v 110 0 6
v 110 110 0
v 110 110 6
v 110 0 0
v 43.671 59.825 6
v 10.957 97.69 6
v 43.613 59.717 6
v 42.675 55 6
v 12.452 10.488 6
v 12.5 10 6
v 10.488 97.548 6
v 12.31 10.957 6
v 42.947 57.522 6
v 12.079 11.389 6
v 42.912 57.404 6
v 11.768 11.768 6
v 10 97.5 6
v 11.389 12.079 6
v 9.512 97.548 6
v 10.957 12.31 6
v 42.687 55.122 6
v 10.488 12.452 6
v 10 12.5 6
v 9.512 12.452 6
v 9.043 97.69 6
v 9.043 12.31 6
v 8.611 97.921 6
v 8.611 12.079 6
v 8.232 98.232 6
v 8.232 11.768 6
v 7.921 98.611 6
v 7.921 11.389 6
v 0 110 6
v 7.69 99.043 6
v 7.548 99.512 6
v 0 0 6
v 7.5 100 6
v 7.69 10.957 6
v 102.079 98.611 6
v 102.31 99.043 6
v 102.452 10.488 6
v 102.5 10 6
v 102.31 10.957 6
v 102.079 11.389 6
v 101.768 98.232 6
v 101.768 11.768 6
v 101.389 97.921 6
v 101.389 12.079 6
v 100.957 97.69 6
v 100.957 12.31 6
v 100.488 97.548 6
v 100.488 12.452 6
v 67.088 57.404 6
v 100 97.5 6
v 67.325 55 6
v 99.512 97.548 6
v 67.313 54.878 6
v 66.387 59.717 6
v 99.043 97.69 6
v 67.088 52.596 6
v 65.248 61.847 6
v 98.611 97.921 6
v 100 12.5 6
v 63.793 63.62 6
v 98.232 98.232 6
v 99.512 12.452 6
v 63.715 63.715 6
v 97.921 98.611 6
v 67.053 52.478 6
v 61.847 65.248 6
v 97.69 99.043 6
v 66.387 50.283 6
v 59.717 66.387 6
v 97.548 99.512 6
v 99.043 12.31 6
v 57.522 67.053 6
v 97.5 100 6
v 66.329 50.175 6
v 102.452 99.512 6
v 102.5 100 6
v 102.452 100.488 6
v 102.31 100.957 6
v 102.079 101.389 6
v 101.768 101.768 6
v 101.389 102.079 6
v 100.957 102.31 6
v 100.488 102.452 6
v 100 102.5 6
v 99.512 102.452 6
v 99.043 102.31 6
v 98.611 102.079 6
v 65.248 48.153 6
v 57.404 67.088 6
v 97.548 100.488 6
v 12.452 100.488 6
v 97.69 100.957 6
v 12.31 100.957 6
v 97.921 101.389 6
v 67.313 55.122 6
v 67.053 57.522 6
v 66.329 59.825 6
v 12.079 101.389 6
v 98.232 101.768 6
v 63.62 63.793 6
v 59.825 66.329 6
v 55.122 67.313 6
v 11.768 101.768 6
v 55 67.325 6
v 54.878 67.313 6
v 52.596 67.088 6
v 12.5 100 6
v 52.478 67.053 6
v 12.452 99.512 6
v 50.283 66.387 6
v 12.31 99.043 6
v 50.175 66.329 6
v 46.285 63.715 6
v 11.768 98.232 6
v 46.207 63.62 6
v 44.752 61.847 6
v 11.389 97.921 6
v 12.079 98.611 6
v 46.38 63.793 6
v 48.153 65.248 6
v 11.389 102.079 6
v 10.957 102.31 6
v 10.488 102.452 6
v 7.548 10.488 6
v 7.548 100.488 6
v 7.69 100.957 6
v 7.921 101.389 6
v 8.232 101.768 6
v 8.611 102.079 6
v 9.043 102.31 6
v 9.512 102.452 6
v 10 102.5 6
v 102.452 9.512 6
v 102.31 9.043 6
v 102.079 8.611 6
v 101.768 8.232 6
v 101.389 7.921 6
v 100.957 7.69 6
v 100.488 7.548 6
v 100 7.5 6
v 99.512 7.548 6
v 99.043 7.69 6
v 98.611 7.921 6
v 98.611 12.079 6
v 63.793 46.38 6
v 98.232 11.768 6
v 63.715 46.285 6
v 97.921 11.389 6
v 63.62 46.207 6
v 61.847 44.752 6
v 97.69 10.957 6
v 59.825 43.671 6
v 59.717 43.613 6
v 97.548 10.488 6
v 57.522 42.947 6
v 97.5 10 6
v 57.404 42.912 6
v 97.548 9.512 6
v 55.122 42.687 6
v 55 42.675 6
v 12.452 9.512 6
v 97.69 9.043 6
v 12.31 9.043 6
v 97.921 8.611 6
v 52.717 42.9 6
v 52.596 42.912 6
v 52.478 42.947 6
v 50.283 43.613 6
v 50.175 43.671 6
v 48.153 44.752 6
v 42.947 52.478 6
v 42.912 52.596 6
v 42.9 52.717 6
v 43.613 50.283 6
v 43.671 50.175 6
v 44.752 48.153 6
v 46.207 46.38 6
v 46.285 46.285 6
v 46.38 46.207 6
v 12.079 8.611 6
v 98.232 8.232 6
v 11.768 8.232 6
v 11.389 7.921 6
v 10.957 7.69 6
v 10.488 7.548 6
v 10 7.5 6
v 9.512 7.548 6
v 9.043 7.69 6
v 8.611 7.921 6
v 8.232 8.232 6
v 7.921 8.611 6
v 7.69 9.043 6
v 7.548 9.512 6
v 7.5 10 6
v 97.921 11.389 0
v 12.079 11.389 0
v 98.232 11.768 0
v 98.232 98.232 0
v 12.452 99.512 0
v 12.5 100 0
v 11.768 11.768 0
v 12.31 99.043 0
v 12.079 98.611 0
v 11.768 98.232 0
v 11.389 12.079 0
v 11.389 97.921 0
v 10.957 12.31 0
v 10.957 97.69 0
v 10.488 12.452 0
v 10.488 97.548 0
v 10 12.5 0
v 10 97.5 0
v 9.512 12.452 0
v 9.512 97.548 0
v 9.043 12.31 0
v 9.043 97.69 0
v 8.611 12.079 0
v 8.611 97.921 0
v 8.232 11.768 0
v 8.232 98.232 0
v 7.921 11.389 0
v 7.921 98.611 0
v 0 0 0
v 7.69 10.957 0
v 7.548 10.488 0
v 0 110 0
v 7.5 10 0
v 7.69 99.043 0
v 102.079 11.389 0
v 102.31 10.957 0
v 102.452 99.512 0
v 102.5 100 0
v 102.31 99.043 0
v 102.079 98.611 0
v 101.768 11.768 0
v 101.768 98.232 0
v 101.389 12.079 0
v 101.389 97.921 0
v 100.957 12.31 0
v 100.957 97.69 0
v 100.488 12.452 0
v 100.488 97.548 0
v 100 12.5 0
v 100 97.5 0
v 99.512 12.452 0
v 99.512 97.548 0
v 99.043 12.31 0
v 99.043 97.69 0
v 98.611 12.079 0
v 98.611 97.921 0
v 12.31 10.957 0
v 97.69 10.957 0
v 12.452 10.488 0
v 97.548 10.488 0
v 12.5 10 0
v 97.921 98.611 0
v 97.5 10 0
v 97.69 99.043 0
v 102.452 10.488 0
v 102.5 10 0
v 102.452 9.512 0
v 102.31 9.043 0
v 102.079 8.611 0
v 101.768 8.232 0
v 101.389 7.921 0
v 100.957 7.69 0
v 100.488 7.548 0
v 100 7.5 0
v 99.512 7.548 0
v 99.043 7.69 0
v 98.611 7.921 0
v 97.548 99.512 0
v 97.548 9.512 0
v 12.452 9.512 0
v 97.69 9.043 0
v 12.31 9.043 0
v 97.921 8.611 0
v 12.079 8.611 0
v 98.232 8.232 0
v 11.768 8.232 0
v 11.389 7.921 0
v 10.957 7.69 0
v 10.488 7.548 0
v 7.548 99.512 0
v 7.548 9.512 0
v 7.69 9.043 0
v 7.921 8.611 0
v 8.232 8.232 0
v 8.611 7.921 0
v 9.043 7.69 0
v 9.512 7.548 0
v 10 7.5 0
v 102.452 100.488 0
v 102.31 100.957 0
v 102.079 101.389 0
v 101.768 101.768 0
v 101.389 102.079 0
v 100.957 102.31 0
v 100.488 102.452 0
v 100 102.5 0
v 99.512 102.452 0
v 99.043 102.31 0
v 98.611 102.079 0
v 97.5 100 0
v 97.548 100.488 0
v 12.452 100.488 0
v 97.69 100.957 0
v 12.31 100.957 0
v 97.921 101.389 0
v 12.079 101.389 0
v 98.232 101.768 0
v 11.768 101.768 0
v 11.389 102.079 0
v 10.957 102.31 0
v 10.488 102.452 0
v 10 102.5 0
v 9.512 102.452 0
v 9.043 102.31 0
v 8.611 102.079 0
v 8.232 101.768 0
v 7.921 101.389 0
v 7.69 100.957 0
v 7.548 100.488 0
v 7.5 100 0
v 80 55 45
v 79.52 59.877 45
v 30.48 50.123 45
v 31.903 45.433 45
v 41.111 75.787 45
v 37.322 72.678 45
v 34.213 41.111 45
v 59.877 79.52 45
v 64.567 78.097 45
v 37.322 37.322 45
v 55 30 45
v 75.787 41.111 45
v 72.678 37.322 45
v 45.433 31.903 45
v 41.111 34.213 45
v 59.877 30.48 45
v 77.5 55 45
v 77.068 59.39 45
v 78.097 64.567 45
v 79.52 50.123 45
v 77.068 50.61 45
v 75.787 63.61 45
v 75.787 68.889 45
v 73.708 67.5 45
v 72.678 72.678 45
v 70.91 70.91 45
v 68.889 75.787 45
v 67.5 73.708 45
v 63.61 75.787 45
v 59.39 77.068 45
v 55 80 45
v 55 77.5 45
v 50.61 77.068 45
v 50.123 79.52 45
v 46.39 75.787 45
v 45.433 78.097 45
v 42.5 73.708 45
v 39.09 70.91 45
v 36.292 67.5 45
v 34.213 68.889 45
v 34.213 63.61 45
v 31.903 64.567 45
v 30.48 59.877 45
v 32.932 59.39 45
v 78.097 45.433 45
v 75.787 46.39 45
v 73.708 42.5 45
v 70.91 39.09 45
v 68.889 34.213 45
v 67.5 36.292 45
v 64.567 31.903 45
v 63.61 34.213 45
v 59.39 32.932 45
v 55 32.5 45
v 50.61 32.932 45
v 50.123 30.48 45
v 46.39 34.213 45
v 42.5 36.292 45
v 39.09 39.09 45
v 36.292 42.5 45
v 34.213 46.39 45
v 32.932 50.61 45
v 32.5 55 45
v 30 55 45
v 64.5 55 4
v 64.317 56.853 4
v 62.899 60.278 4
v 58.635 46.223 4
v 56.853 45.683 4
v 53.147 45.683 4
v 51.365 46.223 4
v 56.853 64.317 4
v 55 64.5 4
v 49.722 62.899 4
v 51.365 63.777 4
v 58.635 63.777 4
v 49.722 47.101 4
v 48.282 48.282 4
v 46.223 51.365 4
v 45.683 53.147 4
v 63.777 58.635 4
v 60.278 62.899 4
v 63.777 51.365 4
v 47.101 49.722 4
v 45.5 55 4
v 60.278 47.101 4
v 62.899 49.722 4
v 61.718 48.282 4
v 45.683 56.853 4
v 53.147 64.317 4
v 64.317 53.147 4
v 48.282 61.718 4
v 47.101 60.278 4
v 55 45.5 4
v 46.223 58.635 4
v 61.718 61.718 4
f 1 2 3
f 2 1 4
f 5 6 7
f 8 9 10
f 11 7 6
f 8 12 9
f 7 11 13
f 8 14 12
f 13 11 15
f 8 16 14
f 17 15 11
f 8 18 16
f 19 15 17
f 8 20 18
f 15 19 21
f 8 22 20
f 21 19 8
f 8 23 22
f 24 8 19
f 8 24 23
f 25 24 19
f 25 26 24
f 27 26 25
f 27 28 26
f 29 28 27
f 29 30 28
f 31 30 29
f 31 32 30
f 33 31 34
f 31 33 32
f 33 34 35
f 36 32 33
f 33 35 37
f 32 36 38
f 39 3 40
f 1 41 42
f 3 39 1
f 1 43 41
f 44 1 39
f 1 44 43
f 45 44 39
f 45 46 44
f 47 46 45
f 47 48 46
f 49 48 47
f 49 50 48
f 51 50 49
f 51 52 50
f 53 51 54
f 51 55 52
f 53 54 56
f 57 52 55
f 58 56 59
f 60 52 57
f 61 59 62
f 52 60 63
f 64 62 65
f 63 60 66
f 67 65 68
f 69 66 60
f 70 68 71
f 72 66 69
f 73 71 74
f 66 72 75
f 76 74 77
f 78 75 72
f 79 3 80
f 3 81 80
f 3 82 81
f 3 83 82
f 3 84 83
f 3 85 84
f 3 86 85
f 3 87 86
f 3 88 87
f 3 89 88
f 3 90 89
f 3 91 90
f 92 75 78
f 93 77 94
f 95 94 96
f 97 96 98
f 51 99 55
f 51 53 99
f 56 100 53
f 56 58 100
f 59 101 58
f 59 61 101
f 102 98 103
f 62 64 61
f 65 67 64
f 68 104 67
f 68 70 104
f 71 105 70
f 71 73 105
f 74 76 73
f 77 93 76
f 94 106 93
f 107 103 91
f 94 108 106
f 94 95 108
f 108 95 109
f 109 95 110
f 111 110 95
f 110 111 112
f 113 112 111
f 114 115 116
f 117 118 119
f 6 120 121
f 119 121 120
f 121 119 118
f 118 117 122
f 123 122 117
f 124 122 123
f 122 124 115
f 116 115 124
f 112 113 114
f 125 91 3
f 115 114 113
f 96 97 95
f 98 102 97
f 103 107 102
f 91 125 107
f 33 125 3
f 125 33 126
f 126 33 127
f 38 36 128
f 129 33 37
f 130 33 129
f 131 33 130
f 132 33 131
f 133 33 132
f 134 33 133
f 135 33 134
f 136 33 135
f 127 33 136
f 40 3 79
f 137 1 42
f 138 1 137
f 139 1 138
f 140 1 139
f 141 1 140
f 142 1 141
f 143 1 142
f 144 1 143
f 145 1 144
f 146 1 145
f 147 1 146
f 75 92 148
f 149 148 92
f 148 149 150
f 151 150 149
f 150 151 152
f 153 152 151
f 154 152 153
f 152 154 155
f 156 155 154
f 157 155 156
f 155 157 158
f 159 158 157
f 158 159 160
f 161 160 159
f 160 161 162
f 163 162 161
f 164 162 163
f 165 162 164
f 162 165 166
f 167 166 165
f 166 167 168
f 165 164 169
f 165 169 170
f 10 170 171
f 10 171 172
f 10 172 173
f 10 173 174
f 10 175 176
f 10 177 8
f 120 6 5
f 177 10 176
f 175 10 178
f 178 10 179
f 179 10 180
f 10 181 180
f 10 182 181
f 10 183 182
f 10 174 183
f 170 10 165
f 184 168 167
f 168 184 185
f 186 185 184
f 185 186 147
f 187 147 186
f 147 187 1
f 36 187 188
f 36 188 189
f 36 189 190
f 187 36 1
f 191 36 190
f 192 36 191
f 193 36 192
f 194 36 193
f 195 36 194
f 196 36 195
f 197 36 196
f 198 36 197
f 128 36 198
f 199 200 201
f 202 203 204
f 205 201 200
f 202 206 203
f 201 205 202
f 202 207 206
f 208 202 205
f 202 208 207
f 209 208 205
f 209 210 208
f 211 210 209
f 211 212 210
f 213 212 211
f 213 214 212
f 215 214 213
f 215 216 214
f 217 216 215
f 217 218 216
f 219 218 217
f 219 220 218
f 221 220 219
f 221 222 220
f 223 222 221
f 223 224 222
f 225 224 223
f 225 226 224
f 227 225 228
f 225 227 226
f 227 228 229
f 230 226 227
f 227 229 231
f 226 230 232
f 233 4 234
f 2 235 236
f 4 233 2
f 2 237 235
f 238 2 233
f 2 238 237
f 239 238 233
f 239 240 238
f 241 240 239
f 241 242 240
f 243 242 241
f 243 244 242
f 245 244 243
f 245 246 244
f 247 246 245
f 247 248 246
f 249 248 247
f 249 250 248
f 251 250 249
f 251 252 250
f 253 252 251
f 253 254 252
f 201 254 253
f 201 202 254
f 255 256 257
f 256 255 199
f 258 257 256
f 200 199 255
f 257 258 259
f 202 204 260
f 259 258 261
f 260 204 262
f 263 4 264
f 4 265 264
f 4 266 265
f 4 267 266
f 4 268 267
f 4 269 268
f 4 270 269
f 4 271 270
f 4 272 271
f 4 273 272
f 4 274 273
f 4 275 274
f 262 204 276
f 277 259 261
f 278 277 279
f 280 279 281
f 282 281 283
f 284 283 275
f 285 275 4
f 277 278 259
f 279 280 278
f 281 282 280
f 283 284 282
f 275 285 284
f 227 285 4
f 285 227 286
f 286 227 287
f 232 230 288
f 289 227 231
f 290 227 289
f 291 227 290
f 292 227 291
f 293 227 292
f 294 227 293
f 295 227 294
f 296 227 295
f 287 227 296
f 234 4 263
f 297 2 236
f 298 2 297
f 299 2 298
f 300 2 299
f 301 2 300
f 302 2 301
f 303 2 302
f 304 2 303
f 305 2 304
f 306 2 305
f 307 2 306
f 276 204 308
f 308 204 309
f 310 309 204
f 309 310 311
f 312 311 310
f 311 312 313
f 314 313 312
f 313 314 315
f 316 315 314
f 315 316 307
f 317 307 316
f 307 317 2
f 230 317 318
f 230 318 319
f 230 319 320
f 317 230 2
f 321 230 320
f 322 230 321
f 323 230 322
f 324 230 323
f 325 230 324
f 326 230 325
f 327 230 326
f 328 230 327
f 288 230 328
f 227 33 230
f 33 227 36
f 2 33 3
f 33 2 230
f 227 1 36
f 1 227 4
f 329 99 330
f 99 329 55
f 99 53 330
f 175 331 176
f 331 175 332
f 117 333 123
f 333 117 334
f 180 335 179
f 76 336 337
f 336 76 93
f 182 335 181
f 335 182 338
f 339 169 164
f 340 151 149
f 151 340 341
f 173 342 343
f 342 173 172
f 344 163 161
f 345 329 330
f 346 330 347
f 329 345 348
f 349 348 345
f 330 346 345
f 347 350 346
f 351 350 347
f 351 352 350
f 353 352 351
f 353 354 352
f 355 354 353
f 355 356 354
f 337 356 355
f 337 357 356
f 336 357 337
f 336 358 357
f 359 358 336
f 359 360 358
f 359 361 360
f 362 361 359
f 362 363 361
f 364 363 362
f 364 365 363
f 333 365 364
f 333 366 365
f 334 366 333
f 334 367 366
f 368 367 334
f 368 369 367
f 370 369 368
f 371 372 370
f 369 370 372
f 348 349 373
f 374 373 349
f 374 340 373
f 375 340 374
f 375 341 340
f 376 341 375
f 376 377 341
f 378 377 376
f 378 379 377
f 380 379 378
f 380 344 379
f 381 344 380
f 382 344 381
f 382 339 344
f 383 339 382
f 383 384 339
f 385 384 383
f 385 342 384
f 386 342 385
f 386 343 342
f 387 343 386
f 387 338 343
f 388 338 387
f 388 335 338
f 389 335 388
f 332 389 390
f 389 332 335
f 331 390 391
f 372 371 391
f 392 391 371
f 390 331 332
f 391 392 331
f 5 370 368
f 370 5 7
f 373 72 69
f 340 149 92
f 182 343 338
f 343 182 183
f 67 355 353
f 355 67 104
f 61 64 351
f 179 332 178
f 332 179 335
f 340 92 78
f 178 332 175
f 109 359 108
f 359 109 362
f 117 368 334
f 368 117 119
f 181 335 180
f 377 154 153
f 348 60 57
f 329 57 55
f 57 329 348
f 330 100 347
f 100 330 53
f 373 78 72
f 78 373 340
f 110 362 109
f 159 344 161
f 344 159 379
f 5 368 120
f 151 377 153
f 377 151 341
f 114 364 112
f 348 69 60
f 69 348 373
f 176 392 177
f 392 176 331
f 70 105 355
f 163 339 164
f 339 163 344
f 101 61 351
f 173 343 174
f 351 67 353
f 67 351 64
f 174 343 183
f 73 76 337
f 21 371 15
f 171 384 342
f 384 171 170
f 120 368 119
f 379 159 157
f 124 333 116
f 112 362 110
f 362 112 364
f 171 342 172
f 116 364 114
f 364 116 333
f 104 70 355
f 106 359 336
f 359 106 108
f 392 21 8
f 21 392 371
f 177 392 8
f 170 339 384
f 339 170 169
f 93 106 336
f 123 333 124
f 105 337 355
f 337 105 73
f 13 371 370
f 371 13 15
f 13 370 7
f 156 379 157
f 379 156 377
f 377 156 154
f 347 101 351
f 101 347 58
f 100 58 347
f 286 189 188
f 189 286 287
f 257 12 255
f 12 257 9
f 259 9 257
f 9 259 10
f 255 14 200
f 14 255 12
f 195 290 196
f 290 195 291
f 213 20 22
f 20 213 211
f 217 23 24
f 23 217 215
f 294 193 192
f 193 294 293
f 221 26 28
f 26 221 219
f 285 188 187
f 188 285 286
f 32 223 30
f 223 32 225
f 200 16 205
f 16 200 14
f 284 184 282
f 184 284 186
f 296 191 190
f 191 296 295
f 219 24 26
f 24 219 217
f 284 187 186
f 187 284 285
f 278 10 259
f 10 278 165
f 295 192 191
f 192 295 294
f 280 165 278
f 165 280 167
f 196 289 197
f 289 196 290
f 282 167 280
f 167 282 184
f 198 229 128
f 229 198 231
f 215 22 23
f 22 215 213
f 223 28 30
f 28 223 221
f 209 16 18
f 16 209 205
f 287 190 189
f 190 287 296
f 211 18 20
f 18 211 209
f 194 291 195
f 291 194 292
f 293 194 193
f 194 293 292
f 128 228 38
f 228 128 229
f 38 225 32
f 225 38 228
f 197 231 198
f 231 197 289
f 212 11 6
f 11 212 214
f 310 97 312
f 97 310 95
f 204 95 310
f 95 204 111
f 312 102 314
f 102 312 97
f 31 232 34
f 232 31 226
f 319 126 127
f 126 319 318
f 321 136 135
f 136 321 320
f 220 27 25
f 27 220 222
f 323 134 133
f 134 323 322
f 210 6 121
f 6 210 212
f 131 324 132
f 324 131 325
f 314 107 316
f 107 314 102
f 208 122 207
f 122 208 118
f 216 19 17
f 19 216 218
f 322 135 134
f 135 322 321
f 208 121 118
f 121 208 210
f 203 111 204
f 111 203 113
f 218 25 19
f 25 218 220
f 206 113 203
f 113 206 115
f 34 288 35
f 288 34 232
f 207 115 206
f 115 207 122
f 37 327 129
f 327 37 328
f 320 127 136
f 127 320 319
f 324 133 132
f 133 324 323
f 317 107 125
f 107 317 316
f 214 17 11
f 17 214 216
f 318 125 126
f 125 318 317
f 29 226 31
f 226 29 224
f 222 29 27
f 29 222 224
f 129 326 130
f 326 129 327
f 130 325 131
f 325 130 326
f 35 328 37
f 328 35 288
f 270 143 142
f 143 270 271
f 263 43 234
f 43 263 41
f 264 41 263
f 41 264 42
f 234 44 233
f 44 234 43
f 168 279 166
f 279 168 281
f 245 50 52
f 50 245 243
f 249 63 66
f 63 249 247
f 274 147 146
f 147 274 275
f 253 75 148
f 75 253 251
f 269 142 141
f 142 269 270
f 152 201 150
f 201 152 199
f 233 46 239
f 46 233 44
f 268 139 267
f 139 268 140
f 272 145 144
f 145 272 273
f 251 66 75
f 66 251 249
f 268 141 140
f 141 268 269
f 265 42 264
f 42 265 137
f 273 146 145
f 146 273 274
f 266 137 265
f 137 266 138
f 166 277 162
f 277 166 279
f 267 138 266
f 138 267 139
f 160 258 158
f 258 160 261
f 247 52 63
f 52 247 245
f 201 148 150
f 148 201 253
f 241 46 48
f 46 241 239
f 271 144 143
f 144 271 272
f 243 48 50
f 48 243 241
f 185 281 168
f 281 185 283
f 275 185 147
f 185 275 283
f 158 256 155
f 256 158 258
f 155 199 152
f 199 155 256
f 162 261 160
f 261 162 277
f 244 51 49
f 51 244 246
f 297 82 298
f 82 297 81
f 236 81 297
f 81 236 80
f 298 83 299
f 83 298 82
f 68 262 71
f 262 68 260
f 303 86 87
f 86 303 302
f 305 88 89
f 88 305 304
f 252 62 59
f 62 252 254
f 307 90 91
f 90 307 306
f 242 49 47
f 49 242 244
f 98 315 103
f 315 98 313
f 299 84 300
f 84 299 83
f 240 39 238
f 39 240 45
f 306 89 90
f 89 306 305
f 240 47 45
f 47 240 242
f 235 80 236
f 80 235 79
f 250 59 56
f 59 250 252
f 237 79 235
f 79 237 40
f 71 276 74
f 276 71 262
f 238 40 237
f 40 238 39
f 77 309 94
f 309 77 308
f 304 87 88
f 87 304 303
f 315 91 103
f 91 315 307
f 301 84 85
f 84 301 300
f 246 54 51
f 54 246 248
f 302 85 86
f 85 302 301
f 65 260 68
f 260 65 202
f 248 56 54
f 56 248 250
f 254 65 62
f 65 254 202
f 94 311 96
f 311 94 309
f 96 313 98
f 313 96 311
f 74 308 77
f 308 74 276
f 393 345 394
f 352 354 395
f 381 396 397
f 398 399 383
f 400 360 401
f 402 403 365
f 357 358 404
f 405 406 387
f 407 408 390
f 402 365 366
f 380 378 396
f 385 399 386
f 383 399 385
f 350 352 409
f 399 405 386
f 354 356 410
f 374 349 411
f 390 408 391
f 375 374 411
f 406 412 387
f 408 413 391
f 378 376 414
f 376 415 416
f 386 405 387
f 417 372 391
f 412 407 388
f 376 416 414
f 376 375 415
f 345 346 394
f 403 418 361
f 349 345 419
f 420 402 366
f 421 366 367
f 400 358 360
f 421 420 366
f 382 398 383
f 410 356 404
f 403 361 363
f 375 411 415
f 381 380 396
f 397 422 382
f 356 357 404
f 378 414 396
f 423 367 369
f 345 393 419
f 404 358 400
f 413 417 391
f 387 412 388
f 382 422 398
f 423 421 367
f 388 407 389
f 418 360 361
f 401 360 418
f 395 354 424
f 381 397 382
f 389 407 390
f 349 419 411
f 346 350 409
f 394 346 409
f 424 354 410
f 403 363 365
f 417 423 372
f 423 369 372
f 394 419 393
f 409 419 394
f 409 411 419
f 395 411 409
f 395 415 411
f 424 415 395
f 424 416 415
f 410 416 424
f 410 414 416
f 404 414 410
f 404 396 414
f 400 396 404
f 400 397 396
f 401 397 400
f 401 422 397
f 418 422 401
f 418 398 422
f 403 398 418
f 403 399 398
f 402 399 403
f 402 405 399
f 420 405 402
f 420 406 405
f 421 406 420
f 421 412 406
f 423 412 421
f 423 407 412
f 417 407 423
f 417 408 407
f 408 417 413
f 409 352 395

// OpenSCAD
$fn = 32;

// ----------------------------------------------------------------------
// Hopper: flanged with square flange
// ----------------------------------------------------------------------

// --- parameters (mm) ---
fl = 110;                 // flange side, X and Y
fl_t = 6;                 // flange thickness
cone_h = 40;              // cone height above the flange
top_d = 50;               // cone mouth diameter
bot_d = 24;               // cone spout diameter
wall = 2.5;               // cone wall thickness
hole_r = 2.5;             // flange hole radius
hole_in = 10;             // hole inset from the corners

bore_d = bot_d - 2 * wall;  // spout bore diameter
total_h = fl_t + cone_h - 1;  // overall height

difference() {
  union() {
    cube([fl, fl, fl_t]);
    translate([fl / 2, fl / 2, fl_t - 1])
      cylinder(h = cone_h, d1 = bot_d, d2 = top_d);
  }
  translate([fl / 2, fl / 2, fl_t - 2])
    cylinder(h = cone_h + 1, d1 = bore_d, d2 = top_d - 2 * wall);
  for (sx = [0, 1], sy = [0, 1])
    translate([sx ? fl - hole_in : hole_in,
               sy ? fl - hole_in : hole_in, -1])
      cylinder(r = hole_r, h = fl_t + 2);
}
